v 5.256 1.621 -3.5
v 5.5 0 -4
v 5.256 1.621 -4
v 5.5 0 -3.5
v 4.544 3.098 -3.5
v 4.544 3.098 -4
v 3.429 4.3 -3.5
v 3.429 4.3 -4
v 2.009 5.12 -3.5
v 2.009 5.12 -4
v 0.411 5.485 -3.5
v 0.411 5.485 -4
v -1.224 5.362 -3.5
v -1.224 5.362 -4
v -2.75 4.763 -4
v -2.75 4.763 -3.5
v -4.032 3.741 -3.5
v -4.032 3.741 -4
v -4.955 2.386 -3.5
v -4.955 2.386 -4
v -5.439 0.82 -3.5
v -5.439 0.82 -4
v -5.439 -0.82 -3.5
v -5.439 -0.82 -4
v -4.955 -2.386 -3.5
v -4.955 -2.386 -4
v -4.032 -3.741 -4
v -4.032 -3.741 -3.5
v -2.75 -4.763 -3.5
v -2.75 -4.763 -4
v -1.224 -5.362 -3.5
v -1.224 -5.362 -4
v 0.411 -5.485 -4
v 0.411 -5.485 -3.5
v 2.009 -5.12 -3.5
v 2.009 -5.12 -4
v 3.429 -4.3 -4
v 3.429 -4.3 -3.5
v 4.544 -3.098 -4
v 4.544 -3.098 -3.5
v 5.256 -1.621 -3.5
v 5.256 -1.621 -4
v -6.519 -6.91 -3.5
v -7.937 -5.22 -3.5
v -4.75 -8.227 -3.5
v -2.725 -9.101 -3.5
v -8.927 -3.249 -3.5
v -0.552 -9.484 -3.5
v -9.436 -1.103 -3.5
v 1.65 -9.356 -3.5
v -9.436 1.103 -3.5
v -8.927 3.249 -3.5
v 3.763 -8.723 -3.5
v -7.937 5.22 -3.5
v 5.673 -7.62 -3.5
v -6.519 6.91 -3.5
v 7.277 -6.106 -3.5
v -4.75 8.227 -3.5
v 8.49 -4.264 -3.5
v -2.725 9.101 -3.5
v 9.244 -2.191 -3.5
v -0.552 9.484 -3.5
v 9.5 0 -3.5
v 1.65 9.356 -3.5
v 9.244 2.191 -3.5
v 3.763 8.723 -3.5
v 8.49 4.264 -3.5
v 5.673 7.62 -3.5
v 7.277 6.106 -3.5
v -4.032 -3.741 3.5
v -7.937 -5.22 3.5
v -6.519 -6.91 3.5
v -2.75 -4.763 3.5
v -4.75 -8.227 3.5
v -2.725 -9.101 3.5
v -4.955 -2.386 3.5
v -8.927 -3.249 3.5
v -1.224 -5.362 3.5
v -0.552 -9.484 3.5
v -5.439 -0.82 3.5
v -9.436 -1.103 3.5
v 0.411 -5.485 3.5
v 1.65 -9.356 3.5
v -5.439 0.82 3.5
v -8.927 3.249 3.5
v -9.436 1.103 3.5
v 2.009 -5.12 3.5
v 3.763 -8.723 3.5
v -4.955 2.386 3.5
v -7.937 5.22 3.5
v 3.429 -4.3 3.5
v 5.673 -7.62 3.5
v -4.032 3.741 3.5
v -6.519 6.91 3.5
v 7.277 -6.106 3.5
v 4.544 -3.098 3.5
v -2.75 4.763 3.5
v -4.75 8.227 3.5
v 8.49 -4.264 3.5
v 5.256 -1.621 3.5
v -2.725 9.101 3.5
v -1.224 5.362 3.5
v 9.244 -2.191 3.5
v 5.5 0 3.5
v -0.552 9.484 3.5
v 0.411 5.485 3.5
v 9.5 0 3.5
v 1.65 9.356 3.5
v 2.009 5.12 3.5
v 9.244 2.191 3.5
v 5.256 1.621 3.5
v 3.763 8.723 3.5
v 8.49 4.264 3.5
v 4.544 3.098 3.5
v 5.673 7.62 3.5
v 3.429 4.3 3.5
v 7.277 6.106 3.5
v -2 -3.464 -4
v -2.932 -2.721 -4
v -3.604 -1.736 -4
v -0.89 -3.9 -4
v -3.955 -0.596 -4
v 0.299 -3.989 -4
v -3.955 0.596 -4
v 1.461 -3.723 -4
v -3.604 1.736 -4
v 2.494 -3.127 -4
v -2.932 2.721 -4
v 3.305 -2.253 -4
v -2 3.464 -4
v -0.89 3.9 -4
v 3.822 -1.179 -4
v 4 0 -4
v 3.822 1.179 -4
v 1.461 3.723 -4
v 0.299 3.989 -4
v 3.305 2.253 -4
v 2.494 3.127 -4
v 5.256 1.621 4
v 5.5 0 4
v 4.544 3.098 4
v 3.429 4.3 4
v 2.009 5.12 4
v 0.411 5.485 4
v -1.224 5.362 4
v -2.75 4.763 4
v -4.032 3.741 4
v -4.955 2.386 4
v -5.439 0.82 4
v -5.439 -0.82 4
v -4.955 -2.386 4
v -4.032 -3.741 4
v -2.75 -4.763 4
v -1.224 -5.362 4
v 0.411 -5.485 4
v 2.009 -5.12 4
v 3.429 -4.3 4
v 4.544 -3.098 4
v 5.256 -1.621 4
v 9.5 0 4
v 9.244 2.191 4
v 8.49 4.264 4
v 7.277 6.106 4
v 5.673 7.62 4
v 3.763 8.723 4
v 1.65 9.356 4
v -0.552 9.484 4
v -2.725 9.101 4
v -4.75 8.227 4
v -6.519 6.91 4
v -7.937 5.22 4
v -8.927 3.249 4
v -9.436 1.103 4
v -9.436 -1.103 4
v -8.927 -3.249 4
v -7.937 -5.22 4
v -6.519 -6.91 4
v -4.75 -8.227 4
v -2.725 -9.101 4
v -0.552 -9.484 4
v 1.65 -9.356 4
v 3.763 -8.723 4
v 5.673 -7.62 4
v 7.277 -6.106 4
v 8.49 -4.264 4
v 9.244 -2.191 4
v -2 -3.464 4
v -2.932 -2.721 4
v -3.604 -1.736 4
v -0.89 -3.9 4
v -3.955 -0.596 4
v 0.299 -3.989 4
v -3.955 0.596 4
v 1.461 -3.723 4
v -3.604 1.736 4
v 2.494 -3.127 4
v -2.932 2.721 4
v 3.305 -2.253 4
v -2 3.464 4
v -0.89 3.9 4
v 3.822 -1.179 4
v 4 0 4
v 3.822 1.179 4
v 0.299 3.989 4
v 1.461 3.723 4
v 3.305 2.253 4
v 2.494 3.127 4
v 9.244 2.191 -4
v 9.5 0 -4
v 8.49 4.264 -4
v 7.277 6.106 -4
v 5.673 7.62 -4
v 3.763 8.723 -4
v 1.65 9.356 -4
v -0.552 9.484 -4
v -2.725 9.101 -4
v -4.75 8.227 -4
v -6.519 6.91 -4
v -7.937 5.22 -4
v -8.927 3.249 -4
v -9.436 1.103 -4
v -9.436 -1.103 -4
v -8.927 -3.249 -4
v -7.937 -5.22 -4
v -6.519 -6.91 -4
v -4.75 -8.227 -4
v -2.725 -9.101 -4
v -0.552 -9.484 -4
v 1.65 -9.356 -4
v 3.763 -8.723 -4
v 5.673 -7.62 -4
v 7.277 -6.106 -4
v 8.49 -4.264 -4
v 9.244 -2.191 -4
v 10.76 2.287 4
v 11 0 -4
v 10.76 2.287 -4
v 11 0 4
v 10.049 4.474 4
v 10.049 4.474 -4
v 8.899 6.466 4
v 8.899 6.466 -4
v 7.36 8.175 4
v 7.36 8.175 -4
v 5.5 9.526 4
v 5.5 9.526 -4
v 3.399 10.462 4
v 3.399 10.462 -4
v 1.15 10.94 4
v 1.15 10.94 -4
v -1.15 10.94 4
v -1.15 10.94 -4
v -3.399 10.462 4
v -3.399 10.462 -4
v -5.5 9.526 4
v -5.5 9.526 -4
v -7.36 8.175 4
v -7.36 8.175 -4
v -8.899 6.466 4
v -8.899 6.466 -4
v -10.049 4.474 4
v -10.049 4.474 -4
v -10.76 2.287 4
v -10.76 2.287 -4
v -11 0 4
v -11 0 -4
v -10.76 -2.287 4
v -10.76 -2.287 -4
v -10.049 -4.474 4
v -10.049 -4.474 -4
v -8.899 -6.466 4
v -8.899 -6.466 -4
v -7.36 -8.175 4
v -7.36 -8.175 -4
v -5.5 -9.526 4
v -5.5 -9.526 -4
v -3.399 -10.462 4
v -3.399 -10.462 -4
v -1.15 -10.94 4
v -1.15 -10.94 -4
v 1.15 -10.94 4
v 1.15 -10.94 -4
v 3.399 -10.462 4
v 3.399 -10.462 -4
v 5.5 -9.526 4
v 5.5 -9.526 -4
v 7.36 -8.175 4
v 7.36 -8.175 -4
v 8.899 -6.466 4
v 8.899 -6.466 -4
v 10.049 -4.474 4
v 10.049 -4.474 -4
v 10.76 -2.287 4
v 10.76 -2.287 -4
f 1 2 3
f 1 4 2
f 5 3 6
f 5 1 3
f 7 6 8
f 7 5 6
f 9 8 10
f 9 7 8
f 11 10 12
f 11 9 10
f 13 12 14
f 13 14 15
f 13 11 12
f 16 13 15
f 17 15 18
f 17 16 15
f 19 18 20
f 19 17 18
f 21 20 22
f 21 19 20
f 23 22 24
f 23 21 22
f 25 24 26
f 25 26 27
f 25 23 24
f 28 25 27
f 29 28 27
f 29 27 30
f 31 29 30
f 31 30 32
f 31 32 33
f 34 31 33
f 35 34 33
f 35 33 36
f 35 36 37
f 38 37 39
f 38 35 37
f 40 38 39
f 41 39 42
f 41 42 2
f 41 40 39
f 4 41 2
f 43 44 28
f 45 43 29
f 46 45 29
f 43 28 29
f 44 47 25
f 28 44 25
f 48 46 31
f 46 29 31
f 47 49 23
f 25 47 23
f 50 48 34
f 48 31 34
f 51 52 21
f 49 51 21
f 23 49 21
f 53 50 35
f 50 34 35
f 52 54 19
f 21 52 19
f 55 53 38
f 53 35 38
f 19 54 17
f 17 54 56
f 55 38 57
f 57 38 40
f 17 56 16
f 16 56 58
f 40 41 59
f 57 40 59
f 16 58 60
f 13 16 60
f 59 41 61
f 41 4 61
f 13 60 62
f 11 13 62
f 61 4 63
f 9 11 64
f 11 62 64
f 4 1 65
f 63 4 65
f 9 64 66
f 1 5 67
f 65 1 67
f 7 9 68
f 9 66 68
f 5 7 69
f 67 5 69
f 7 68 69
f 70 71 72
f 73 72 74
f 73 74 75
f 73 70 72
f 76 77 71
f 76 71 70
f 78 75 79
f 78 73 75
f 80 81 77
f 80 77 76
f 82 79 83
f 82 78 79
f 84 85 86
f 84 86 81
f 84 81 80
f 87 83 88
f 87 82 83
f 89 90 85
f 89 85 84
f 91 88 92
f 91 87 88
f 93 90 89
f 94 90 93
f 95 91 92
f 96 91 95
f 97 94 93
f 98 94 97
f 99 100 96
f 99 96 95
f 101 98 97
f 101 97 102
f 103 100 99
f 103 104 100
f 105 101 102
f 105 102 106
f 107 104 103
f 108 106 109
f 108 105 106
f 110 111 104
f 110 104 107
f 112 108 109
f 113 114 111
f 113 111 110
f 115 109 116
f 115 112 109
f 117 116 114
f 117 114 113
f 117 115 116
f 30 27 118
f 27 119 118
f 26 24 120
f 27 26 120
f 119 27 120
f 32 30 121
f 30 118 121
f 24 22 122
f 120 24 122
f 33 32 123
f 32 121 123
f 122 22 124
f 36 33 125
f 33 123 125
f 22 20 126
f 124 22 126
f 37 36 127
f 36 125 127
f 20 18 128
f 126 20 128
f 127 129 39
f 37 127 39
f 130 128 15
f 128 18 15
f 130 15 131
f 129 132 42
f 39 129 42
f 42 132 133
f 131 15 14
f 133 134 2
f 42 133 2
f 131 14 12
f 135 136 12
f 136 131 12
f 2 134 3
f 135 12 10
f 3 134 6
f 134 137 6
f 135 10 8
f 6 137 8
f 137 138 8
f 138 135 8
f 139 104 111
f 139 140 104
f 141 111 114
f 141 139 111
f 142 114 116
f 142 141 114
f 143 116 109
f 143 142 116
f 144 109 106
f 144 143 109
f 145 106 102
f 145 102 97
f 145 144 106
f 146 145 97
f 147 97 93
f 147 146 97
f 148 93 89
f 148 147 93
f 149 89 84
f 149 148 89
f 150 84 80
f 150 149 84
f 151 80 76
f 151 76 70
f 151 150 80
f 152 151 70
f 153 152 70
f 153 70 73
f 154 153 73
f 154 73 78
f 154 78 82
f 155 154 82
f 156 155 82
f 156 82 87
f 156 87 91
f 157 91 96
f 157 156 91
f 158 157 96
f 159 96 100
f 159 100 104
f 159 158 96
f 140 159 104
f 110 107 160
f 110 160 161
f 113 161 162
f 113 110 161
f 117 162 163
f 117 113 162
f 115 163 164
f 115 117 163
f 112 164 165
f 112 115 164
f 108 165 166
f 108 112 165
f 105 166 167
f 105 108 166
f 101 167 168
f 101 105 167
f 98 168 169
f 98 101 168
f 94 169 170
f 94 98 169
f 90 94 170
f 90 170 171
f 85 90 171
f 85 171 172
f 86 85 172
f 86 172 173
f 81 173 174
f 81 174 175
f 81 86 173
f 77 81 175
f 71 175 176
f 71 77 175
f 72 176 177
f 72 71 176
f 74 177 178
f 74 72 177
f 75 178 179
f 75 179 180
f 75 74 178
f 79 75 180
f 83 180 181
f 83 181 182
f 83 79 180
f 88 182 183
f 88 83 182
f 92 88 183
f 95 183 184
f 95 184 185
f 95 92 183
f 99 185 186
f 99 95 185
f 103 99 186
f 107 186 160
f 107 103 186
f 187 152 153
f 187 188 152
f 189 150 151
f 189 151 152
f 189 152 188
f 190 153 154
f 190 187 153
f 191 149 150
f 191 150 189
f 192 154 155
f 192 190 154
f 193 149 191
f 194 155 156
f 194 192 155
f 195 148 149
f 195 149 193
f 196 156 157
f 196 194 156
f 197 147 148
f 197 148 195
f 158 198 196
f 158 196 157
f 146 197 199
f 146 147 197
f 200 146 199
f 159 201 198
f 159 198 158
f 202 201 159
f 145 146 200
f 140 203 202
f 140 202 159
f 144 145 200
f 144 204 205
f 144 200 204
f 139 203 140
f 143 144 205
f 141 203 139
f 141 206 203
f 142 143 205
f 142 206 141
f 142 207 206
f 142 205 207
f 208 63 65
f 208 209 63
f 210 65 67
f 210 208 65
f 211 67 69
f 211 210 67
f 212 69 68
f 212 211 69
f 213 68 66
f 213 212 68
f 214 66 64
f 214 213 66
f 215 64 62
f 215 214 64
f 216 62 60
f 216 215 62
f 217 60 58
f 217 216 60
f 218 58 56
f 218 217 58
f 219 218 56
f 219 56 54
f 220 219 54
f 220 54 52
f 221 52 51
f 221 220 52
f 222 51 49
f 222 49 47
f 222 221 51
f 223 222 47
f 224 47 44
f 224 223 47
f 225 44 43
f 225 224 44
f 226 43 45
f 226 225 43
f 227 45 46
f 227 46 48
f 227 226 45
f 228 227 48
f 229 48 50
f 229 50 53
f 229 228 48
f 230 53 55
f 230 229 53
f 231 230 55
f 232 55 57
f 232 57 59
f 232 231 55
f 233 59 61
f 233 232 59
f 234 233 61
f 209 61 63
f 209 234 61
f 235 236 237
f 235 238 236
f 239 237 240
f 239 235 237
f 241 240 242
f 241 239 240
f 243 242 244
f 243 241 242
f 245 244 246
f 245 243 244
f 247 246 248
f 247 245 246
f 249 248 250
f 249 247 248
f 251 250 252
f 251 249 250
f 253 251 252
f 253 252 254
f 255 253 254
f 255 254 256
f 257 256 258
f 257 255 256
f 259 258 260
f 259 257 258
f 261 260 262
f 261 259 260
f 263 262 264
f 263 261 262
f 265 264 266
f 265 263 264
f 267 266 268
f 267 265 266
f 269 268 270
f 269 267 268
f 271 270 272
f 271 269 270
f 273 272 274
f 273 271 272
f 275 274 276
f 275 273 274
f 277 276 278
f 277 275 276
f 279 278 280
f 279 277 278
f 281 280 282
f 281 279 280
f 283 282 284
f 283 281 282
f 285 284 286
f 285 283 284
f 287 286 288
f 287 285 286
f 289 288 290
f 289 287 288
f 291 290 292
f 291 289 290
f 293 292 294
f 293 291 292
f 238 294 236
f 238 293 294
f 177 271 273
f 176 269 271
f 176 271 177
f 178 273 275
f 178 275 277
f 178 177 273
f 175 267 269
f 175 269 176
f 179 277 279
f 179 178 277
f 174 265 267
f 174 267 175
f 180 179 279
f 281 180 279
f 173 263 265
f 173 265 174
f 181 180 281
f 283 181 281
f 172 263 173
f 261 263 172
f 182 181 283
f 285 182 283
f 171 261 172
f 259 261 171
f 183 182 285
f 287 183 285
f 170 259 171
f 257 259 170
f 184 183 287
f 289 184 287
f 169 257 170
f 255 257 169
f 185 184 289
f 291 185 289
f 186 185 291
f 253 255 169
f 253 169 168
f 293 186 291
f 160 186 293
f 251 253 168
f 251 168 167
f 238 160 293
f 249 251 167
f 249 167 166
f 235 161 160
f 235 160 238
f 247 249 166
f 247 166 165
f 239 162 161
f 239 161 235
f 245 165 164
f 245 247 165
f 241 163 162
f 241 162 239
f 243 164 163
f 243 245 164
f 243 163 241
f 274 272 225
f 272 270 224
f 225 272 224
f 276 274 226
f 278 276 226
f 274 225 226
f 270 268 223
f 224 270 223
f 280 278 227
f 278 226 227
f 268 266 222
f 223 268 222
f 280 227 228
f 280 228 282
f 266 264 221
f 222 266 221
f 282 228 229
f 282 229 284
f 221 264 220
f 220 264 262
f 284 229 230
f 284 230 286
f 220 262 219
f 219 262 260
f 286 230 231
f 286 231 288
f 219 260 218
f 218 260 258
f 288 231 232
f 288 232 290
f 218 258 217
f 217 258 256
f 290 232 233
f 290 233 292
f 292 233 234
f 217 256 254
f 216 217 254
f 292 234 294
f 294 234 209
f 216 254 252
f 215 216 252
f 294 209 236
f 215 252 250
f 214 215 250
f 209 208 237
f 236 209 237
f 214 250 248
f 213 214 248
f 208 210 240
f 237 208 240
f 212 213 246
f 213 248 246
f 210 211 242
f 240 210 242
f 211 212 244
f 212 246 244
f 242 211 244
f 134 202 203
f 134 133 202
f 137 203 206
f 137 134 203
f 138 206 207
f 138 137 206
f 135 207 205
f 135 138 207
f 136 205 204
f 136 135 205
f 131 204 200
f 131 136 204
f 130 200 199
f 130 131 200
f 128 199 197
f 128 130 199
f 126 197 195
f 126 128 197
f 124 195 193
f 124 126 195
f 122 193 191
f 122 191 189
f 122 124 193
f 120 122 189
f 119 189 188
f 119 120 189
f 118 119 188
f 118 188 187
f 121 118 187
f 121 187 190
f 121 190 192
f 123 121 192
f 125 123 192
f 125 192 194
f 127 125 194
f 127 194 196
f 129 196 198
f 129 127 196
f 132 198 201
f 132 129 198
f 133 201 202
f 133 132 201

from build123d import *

# Parameters (mm, degrees)
SALIENTE_EXTRUIR1_DEPTH        = 4
SALIENTE_EXTRUIR1_DEPTH_BACK   = 4
CROQUIS1_R                     = 11
CROQUIS1_R_2                   = 9.5
SALIENTE_EXTRUIR1_2_DEPTH      = 4
SALIENTE_EXTRUIR1_2_DEPTH_BACK = 4
CROQUIS1_R_3                   = 5.5
CROQUIS1_R_4                   = 4
SALIENTE_EXTRUIR2_DEPTH        = 3.5
SALIENTE_EXTRUIR2_DEPTH_BACK   = 3.5
CROQUIS1_4_R                   = 9.5
CROQUIS1_4_R_2                 = 5.5


with BuildPart() as part:
    # Croquis1 → Saliente-Extruir1 (new, two sides: drawn at the far end of the back side and taken through both)
    with BuildSketch(Plane.XY.offset(-SALIENTE_EXTRUIR1_DEPTH_BACK)):
        Circle(CROQUIS1_R)
        Circle(CROQUIS1_R_2, mode=Mode.SUBTRACT)
    extrude(amount=SALIENTE_EXTRUIR1_DEPTH + SALIENTE_EXTRUIR1_DEPTH_BACK)



with BuildPart() as body_2:
    # Croquis1 → Saliente-Extruir1 2 (new, two sides: drawn at the far end of the back side and taken through both)
    with BuildSketch(Plane.XY.offset(-SALIENTE_EXTRUIR1_2_DEPTH_BACK)):
        Circle(CROQUIS1_R_3)
        Circle(CROQUIS1_R_4, mode=Mode.SUBTRACT)
    extrude(amount=SALIENTE_EXTRUIR1_2_DEPTH + SALIENTE_EXTRUIR1_2_DEPTH_BACK)


with BuildPart() as part_1:
    add(part.part)

    add(body_2.part)  # Saliente-Extruir2 merges body 2
    # Croquis1<4> → Saliente-Extruir2 (add, two sides: drawn at the far end of the back side and taken through both)
    with BuildSketch(Plane.XY.offset(-SALIENTE_EXTRUIR2_DEPTH_BACK)):
        Circle(CROQUIS1_4_R)
        Circle(CROQUIS1_4_R_2, mode=Mode.SUBTRACT)
    extrude(amount=SALIENTE_EXTRUIR2_DEPTH + SALIENTE_EXTRUIR2_DEPTH_BACK)


solid = part_1.part
